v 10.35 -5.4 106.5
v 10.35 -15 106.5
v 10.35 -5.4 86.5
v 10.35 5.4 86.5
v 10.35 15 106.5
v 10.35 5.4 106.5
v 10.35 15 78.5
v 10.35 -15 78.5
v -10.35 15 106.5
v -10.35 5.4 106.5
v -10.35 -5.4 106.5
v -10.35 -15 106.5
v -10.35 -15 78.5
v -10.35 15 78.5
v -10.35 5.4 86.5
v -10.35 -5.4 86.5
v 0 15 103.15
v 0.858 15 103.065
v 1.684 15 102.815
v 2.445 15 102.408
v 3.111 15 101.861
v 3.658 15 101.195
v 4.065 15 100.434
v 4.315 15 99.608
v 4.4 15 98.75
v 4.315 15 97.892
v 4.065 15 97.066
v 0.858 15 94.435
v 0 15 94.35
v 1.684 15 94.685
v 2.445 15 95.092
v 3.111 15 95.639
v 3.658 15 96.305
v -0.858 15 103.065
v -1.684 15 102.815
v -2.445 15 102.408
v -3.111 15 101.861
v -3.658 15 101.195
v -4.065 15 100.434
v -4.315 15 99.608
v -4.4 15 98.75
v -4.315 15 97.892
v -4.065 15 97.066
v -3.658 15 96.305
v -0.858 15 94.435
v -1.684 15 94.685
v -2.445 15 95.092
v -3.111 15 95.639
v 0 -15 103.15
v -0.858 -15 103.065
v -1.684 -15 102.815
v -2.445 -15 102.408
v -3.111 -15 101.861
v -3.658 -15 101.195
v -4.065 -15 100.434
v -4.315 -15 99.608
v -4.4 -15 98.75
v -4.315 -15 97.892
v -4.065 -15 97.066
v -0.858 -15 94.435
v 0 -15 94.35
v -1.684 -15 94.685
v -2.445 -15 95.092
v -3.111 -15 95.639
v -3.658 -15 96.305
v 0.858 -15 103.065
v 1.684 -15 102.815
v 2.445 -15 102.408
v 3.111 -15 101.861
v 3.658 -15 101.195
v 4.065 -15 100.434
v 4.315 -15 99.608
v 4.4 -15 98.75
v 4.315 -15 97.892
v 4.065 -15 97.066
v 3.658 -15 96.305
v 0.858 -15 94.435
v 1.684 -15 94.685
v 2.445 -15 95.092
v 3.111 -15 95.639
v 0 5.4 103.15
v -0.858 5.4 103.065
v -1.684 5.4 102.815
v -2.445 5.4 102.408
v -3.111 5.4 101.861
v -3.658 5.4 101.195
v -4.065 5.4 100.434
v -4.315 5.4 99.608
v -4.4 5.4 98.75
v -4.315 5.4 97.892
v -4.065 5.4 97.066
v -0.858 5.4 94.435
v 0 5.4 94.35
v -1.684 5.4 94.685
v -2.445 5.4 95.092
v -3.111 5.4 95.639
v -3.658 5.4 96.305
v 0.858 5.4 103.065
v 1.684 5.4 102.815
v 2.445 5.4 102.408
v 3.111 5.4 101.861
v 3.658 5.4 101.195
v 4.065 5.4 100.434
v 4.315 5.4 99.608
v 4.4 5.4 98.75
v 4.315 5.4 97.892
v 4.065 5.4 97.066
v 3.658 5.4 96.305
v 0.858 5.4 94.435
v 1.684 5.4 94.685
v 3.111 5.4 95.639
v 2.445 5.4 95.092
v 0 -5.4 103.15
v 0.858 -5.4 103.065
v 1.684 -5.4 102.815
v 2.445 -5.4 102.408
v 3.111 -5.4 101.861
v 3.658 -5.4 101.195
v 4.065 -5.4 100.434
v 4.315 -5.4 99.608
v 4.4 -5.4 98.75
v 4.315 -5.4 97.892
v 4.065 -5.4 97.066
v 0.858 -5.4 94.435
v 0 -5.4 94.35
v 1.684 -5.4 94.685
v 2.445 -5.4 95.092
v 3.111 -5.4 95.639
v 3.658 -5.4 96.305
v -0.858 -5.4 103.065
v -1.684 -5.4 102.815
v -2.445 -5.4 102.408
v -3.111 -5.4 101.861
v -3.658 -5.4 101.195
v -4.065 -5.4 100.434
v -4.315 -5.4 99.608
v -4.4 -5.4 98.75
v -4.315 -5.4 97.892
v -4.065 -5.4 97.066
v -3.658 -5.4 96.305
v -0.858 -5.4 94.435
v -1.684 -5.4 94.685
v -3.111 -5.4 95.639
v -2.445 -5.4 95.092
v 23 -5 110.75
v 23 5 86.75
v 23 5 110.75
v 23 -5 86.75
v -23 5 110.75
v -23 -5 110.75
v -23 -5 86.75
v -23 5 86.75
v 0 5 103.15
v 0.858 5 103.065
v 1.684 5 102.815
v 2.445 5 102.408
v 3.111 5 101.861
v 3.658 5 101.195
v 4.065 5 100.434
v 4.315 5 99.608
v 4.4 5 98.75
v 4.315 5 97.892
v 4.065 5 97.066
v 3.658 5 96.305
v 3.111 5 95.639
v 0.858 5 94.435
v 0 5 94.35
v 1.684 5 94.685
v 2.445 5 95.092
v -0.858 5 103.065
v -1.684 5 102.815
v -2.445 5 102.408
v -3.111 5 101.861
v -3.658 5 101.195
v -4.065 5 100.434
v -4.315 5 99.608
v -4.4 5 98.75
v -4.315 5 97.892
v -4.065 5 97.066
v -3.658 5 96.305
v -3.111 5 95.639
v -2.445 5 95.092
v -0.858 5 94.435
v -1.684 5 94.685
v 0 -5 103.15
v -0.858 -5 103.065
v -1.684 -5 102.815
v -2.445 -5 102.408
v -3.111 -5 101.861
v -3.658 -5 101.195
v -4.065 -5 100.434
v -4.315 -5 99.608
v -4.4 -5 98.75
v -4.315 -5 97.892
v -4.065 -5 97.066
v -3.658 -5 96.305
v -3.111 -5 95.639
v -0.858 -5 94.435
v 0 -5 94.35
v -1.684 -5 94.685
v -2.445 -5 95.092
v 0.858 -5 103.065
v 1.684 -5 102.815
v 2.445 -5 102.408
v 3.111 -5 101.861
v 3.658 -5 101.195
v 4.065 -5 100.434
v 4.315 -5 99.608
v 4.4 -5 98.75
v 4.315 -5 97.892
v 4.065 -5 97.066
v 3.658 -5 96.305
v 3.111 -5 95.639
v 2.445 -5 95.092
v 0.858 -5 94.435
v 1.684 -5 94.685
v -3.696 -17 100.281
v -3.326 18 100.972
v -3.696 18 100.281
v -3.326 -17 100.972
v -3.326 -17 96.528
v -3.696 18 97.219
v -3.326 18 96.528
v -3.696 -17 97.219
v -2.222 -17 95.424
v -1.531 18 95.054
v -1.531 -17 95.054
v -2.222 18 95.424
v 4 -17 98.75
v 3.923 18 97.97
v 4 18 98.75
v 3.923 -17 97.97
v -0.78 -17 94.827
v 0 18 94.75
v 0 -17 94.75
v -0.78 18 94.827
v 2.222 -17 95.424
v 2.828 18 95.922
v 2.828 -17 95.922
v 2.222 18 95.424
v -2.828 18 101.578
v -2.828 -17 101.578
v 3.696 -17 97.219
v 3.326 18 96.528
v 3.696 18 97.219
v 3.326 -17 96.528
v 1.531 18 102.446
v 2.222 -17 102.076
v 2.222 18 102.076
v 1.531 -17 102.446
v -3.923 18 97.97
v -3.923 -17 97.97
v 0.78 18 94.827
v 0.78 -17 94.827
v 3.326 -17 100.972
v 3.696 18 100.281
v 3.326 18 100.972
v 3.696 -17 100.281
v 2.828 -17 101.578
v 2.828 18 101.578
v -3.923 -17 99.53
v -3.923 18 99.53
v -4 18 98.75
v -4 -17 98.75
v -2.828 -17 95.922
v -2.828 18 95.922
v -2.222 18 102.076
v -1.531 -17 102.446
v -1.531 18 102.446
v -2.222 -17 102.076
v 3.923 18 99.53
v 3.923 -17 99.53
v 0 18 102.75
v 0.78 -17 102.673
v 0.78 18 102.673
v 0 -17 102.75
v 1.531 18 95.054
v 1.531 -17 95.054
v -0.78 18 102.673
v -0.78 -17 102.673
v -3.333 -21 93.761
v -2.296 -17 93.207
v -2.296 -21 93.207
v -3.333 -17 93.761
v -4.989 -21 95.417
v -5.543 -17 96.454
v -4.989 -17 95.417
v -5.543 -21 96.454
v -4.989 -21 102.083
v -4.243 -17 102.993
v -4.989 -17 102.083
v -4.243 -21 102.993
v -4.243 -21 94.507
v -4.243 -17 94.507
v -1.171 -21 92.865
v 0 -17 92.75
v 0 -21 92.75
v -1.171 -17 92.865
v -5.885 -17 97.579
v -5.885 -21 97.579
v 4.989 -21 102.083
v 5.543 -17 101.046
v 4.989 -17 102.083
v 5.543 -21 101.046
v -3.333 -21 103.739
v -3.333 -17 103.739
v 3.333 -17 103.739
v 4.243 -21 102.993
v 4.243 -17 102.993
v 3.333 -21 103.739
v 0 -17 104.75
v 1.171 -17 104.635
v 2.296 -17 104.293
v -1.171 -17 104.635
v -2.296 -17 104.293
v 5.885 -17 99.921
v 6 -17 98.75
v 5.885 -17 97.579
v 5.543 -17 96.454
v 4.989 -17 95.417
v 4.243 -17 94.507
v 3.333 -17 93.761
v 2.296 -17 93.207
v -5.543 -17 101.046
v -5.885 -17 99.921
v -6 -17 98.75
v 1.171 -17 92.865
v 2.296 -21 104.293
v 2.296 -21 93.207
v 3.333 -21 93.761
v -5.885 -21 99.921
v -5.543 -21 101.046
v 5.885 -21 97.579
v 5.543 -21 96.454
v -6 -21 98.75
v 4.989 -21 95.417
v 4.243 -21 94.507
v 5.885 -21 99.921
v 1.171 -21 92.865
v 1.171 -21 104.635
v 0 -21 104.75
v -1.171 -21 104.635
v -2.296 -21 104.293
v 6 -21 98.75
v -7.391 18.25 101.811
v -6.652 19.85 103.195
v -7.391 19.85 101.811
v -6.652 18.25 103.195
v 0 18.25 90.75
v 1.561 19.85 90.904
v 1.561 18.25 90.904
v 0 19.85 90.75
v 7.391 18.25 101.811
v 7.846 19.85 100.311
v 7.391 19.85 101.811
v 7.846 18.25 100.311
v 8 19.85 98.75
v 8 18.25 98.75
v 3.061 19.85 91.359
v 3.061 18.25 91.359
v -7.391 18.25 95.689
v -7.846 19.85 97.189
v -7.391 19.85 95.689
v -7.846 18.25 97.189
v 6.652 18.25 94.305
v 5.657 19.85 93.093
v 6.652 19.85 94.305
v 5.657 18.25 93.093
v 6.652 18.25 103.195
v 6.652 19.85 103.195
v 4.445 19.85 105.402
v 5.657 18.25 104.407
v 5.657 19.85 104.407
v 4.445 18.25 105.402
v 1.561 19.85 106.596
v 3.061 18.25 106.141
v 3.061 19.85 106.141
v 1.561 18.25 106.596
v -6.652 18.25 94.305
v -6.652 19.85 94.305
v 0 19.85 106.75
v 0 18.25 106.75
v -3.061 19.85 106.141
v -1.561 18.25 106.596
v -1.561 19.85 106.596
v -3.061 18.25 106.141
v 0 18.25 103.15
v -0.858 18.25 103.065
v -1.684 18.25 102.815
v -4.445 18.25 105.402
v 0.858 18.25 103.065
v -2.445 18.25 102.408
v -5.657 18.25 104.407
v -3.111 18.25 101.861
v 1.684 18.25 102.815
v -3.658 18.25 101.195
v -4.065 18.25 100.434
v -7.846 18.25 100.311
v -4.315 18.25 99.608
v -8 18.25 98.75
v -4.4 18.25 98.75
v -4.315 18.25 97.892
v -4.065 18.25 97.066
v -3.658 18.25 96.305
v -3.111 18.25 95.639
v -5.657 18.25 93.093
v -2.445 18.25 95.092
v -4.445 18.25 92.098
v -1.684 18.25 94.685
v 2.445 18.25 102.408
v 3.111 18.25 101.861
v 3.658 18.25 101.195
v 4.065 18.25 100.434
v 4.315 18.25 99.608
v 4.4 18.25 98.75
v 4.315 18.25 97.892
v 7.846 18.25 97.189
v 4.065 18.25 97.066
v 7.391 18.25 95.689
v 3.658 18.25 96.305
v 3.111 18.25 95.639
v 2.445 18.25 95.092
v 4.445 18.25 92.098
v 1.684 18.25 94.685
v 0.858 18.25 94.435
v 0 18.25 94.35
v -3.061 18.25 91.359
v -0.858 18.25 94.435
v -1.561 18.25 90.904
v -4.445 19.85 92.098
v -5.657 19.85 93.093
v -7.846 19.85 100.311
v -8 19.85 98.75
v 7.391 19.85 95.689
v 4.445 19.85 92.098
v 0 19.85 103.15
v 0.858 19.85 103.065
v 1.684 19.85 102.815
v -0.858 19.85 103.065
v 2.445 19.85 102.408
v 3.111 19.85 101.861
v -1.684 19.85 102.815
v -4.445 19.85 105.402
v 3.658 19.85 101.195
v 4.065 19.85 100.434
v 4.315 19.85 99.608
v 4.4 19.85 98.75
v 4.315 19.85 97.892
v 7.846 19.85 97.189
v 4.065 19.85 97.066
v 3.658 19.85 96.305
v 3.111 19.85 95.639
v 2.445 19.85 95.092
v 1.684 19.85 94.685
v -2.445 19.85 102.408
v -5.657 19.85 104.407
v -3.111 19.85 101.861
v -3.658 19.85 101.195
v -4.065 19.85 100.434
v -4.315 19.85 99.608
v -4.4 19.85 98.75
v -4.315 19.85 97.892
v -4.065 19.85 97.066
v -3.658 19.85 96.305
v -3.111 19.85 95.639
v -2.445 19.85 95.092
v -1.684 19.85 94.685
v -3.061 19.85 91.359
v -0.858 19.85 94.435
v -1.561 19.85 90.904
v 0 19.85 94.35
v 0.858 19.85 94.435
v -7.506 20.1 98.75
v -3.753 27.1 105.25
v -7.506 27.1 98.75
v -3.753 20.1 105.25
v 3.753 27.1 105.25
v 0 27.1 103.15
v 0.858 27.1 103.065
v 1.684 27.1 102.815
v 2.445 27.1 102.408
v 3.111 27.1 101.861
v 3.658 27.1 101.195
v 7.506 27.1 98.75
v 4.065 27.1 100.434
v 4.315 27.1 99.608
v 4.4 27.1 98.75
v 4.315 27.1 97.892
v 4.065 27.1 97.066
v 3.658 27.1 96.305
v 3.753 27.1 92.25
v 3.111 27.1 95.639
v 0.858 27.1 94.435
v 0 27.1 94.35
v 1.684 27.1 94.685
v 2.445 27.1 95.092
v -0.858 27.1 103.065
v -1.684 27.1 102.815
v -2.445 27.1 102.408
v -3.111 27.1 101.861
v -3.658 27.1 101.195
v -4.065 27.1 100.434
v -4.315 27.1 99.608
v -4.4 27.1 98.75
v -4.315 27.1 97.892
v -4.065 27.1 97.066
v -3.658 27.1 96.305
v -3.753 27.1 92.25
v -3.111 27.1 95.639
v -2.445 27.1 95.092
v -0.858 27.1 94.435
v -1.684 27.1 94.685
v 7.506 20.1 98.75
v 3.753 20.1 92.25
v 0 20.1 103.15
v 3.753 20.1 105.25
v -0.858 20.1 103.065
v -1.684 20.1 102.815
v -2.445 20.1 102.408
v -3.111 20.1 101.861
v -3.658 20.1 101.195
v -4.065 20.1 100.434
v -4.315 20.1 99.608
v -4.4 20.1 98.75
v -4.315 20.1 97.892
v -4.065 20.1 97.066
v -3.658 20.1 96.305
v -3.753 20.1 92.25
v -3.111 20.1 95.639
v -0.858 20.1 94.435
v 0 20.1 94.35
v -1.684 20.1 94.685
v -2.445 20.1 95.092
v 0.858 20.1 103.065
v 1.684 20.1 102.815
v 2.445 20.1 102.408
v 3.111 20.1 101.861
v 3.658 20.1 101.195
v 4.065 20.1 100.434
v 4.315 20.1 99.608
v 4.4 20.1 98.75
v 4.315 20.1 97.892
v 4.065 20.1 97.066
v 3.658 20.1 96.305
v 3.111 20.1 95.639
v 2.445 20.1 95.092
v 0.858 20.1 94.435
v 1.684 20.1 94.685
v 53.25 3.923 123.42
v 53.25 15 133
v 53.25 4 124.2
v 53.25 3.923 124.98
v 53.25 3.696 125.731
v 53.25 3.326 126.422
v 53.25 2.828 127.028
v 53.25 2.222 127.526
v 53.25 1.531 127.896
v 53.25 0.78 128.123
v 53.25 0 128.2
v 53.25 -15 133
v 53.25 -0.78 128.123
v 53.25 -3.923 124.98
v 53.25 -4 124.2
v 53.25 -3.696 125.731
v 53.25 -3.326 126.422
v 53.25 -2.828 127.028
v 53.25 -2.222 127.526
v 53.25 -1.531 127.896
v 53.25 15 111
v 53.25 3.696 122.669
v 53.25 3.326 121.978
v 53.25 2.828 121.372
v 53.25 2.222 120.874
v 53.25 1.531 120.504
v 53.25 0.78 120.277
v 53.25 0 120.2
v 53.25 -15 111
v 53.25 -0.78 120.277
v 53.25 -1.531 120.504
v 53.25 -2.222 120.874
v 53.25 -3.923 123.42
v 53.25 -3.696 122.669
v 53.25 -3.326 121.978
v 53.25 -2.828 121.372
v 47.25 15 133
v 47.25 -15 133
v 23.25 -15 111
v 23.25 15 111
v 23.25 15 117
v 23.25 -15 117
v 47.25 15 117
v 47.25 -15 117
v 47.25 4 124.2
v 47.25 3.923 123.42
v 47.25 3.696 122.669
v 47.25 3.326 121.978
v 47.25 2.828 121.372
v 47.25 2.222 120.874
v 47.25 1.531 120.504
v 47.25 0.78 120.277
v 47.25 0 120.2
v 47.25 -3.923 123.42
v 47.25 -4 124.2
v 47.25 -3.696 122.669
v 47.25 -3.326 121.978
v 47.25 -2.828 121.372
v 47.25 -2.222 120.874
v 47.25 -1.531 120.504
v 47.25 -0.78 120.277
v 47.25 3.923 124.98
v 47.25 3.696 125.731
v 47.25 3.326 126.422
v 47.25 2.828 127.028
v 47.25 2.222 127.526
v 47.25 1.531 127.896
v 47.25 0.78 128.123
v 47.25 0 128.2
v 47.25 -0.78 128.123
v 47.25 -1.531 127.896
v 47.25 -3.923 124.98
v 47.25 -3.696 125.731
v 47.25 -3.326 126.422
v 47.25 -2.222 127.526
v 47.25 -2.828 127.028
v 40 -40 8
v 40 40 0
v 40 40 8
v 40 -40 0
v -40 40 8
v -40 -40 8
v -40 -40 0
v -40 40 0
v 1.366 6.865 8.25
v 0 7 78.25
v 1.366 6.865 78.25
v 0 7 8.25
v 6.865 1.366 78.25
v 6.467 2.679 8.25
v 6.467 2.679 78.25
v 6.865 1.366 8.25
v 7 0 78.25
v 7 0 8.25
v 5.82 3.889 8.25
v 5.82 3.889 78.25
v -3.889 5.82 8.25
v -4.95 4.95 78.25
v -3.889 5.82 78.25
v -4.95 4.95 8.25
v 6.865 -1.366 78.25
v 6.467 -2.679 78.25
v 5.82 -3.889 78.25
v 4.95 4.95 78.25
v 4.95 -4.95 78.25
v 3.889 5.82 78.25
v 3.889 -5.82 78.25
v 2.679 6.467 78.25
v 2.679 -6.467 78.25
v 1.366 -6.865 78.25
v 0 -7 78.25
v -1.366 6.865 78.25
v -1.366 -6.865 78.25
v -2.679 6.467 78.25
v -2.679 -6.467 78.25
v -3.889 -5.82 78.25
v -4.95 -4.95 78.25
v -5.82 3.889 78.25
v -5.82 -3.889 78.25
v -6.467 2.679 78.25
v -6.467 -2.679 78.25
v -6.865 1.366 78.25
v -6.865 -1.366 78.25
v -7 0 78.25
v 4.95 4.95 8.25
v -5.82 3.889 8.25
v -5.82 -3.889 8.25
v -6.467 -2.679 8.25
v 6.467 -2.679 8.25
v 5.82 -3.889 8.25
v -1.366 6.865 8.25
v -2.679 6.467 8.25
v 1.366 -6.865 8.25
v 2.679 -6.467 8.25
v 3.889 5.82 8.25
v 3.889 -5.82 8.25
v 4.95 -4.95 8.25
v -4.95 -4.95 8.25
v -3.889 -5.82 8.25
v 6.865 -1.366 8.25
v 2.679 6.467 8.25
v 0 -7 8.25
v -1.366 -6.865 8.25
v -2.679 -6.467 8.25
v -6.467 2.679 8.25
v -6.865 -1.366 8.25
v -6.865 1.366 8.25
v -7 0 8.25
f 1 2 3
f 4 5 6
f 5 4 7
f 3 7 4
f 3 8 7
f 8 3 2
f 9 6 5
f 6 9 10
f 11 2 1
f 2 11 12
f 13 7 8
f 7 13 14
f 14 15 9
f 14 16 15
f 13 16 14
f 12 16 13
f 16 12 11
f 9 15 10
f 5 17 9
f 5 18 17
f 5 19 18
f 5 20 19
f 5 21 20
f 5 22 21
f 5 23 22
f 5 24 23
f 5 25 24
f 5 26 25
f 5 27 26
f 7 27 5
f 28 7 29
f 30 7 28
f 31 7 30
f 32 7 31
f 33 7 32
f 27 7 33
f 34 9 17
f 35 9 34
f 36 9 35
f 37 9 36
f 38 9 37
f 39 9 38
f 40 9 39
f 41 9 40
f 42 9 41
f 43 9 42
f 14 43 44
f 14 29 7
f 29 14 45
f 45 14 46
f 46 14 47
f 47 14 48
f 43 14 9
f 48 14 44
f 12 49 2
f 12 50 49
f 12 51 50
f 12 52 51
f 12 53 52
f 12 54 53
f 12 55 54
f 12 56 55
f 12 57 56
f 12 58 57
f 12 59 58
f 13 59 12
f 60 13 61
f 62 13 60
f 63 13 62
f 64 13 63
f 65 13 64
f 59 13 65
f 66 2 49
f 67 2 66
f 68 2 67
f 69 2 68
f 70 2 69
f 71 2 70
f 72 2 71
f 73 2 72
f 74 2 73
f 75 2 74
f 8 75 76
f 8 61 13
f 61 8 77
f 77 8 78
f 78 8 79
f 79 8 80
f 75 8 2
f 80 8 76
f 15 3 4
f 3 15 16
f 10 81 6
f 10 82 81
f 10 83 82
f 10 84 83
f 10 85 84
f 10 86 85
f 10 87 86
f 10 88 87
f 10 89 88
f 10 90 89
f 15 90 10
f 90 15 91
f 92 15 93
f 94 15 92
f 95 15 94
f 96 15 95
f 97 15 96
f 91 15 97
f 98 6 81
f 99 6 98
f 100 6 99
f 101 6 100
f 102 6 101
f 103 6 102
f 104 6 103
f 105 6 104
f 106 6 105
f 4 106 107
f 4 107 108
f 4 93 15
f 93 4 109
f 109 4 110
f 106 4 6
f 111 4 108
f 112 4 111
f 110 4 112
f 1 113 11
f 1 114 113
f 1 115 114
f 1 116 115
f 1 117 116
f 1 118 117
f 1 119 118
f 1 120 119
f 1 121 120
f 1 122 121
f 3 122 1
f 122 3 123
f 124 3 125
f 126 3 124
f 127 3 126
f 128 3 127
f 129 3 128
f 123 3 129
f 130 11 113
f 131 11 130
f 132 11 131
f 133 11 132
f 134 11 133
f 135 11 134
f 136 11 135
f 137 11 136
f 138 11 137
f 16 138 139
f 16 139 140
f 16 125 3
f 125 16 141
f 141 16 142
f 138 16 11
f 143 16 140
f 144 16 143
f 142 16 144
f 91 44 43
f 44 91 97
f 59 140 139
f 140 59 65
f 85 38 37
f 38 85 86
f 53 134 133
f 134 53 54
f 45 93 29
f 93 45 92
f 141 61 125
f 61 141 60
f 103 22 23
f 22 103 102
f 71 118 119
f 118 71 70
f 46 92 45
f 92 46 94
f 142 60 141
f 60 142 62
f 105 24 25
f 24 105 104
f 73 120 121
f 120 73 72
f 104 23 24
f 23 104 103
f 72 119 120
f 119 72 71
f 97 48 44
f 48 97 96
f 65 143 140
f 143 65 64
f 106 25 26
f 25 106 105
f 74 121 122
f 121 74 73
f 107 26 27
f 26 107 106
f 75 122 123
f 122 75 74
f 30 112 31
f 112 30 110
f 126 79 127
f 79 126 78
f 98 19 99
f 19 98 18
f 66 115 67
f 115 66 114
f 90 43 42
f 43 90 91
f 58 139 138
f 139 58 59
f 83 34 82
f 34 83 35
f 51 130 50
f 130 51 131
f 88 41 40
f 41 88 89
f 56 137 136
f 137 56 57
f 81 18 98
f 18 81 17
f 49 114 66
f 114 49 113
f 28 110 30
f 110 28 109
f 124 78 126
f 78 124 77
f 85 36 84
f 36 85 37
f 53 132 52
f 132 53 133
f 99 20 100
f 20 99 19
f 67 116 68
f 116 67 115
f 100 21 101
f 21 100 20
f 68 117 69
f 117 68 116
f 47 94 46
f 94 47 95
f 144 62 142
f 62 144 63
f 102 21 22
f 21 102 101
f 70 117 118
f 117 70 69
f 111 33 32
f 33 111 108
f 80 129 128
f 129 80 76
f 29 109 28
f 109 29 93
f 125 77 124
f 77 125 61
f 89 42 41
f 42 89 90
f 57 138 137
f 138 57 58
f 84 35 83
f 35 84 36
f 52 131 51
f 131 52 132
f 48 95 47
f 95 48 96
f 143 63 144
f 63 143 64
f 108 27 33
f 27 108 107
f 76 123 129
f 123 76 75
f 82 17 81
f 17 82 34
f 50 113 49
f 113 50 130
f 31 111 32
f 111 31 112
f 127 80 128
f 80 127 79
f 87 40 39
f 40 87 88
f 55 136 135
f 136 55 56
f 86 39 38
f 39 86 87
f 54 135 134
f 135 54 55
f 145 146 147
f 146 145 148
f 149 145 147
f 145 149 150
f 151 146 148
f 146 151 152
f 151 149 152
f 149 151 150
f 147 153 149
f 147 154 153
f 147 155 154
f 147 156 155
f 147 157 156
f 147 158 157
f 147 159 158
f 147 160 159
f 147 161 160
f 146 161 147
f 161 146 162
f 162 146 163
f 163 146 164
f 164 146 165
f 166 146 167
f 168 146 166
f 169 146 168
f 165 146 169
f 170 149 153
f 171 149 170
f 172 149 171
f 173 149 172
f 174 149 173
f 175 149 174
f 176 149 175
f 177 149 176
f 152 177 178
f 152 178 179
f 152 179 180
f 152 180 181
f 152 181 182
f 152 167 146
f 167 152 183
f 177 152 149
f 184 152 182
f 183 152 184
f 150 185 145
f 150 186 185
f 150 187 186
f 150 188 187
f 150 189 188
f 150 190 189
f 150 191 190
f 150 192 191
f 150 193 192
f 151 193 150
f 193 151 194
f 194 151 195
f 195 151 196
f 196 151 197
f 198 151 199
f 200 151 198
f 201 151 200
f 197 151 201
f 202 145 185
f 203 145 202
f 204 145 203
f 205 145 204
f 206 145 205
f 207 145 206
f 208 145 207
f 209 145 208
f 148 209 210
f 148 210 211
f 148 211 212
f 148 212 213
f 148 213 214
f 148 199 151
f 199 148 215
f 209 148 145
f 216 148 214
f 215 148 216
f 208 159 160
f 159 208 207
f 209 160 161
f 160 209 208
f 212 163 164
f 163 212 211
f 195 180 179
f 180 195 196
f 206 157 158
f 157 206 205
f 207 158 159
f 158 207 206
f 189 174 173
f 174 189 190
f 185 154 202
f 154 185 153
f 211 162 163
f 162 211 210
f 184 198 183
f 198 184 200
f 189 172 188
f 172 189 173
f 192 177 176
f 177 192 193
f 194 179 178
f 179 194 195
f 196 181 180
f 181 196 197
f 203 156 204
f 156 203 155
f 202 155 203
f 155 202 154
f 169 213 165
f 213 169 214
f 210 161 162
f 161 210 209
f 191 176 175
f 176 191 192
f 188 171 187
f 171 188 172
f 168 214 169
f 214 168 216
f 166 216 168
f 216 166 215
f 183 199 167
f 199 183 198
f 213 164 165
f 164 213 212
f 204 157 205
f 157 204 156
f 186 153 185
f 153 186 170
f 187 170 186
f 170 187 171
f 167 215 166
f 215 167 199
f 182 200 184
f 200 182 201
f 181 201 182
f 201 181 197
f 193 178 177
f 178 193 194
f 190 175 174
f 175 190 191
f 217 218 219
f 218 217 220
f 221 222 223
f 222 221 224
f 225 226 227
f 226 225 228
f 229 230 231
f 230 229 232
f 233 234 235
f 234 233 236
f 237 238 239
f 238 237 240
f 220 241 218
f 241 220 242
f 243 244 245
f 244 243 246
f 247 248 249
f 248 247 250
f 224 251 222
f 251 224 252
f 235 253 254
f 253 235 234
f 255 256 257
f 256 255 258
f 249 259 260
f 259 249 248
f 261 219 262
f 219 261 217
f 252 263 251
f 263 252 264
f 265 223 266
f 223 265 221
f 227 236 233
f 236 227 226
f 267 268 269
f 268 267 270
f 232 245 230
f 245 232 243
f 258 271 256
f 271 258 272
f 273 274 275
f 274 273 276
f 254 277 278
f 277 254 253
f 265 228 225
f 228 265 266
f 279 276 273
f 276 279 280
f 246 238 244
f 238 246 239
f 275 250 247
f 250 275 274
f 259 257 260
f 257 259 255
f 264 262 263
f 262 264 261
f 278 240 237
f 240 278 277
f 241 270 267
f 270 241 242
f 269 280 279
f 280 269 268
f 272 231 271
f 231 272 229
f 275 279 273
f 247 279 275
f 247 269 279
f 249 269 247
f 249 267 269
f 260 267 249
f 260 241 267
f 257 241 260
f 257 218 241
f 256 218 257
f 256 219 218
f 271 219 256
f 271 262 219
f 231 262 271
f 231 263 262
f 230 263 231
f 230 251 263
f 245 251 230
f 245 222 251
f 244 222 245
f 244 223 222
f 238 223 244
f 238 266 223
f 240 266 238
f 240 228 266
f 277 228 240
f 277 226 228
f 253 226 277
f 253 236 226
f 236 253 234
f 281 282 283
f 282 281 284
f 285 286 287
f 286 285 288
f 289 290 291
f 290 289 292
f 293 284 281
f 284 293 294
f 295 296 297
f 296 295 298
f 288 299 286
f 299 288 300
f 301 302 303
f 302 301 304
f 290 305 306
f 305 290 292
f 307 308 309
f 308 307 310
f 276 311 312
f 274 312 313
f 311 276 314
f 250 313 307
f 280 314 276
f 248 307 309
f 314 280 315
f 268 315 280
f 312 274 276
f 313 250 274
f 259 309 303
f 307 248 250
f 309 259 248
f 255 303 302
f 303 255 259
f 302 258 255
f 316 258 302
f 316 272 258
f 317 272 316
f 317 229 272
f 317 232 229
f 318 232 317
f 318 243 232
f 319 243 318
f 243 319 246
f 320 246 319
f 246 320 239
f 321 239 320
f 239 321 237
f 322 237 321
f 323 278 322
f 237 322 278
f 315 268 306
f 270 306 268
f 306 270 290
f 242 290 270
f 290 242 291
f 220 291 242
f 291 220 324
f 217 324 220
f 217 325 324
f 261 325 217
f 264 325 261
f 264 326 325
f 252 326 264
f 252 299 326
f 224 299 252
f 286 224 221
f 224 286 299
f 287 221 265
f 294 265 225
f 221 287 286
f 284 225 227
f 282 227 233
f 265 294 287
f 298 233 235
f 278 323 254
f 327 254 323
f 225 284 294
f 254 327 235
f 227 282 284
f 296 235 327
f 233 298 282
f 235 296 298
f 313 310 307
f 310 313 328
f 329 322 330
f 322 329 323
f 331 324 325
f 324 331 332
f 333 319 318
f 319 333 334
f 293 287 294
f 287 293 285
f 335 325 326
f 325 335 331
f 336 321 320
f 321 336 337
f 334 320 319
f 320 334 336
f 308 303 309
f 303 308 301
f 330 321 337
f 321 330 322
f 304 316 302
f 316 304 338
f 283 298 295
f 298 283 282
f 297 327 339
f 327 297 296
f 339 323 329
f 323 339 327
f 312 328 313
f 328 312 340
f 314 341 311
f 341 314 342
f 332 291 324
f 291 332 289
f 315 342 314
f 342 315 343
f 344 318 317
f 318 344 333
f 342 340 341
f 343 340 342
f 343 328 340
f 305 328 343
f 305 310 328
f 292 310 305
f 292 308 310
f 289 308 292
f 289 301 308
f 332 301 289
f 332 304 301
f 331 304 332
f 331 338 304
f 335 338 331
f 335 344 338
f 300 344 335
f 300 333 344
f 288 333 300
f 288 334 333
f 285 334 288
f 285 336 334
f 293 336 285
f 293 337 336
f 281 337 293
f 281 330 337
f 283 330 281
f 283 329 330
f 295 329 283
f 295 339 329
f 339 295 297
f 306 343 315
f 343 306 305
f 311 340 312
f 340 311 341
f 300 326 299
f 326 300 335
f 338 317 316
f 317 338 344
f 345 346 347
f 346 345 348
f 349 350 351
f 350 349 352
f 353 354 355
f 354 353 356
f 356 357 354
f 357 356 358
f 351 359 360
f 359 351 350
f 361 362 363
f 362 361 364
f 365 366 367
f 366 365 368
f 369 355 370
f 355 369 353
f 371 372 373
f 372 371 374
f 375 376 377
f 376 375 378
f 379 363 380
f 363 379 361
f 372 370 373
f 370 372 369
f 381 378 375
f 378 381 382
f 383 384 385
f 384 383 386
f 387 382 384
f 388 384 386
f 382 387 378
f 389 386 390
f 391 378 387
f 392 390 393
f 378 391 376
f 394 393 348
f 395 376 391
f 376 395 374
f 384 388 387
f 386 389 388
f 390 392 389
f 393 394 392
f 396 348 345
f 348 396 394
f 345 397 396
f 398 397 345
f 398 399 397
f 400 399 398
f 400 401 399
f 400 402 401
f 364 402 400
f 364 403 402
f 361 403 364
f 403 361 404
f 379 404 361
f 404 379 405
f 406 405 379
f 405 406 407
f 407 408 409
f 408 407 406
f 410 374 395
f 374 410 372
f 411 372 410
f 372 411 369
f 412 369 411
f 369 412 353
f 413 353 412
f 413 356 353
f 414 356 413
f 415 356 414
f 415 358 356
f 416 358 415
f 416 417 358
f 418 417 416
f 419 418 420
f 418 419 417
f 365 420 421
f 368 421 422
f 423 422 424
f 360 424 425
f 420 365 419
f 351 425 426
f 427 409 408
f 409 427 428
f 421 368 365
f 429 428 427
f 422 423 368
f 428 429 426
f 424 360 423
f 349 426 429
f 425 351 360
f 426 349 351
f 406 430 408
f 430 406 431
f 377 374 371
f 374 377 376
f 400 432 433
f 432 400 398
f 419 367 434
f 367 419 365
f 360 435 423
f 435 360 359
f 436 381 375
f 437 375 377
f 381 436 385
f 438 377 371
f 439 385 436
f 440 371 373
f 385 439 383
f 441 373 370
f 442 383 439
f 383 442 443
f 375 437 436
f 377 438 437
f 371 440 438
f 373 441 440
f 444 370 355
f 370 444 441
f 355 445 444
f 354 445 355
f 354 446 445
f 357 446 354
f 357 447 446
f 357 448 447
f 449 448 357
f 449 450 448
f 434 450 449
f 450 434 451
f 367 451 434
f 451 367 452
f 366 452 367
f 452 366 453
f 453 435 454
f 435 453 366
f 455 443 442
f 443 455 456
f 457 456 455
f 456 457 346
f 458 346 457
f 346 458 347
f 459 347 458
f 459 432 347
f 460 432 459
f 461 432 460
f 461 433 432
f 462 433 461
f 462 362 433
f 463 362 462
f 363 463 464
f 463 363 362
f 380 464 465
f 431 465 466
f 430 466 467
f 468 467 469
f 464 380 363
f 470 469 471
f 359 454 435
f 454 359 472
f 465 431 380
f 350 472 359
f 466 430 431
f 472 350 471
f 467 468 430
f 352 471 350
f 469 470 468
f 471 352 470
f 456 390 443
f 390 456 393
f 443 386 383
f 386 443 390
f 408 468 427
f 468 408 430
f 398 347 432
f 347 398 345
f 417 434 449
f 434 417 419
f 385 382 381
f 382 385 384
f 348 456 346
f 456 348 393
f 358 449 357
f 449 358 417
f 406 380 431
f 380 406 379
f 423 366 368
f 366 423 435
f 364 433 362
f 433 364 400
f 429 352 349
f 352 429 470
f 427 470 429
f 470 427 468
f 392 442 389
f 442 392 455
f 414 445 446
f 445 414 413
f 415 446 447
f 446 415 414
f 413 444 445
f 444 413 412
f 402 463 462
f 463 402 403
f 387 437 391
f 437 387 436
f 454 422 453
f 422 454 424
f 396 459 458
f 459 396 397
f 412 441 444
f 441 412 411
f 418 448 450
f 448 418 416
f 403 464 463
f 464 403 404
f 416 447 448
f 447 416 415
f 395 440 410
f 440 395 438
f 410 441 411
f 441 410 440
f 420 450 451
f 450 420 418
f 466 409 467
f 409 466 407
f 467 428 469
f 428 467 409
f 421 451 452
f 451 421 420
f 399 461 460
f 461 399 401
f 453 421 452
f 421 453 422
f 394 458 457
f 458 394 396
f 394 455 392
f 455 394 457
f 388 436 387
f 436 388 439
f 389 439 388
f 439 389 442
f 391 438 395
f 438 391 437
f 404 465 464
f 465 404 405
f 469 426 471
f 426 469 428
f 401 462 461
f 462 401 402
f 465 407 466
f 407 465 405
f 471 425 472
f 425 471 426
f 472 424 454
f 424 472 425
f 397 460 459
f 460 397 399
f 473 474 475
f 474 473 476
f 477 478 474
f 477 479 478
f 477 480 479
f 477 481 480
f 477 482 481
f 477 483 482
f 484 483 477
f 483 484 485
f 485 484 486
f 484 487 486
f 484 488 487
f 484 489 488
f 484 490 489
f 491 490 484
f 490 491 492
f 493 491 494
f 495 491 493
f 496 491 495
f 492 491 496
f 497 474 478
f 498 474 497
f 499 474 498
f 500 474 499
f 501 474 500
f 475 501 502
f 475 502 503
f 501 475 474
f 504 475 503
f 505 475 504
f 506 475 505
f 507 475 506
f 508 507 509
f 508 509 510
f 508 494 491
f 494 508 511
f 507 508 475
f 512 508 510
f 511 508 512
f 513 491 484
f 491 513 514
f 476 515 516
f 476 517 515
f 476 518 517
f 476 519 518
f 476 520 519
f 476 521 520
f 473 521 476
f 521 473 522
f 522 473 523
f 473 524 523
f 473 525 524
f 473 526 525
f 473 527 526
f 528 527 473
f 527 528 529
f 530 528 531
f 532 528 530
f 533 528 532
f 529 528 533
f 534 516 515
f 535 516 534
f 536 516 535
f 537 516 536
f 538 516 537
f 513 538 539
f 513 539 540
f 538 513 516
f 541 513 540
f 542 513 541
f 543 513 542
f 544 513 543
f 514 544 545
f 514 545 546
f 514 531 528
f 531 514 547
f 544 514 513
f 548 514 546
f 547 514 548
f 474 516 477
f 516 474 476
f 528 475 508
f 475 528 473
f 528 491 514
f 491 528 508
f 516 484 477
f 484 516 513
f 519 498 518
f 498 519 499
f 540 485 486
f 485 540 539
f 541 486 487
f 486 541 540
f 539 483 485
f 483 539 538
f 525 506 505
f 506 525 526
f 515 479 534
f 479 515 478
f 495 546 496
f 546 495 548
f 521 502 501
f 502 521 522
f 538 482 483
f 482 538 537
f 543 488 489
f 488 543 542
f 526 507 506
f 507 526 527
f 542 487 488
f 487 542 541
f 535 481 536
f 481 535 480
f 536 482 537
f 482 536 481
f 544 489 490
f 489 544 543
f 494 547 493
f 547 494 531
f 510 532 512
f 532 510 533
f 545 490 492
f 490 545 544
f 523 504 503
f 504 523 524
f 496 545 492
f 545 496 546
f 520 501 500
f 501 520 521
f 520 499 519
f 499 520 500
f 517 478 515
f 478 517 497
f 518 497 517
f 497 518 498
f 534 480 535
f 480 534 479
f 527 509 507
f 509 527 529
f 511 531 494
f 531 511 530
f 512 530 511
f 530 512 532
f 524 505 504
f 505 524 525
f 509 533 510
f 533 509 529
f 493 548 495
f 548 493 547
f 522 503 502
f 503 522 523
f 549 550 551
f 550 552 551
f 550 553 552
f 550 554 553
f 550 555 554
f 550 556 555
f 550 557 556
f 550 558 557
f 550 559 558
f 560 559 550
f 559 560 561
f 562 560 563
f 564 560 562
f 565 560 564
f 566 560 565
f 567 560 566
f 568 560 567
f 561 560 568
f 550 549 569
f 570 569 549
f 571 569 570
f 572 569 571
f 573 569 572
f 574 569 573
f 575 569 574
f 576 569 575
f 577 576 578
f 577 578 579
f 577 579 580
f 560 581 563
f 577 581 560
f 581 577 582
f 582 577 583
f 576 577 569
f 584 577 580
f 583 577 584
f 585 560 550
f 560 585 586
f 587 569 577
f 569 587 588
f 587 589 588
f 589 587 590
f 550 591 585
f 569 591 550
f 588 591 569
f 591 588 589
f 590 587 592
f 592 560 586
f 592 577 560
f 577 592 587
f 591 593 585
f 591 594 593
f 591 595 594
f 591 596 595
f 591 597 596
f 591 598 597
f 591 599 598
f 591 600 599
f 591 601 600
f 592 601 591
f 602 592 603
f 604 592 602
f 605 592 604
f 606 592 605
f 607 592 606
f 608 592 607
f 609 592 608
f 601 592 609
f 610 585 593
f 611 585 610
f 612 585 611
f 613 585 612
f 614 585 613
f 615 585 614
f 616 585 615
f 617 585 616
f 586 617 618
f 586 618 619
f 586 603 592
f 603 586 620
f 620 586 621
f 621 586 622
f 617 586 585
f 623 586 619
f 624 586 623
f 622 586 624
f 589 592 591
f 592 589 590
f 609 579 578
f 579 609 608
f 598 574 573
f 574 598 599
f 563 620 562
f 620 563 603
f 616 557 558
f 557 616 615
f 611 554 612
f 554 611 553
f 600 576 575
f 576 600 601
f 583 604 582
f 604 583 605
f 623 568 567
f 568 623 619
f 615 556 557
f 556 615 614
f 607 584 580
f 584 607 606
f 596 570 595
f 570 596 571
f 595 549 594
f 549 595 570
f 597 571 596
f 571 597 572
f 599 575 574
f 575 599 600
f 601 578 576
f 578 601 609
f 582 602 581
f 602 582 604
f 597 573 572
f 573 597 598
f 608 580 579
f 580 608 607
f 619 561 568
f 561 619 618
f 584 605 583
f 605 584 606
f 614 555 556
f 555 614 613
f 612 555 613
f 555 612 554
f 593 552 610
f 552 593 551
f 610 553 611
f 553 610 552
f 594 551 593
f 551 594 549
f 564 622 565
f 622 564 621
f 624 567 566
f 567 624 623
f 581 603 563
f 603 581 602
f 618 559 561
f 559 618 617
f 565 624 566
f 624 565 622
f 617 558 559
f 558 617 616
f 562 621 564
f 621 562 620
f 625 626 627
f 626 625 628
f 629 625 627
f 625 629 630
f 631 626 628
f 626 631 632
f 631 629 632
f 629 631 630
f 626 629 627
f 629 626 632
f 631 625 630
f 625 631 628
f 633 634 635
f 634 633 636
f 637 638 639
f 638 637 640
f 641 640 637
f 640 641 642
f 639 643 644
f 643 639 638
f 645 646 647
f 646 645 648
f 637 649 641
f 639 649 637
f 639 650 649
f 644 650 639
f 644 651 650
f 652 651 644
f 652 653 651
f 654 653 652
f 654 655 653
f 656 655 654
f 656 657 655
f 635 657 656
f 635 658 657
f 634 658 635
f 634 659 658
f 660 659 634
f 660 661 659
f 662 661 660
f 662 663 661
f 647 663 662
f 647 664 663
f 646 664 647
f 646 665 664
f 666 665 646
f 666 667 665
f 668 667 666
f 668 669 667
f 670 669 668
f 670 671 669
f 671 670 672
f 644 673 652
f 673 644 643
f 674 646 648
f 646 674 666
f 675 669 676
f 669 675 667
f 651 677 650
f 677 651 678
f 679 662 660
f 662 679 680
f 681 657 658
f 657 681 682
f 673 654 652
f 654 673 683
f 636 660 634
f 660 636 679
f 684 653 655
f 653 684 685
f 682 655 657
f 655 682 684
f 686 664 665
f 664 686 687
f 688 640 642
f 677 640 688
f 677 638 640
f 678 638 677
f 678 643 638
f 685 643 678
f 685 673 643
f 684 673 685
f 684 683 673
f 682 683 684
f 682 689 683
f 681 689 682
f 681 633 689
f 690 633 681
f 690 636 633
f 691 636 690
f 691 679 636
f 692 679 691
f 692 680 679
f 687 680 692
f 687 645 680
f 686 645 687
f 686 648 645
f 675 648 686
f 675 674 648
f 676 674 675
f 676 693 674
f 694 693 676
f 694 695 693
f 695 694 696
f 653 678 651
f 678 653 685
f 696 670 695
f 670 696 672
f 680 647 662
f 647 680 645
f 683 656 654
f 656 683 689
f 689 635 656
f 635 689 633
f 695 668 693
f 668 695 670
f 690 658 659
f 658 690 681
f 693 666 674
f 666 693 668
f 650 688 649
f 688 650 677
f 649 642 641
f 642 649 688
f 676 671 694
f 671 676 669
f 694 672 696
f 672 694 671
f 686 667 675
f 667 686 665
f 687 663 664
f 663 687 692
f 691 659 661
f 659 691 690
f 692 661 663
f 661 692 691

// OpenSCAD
$fn = 32;

// ------------------------------------------------------------------------
// Lamp arm: column d14 x 70 mm, arm 46 mm
// Every part is its own module, assembly() places every instance.
// ------------------------------------------------------------------------

// --- part 1 ---
module lamp_base() {
  difference() {
    translate([-40, -40, 0]) cube([80, 80, 8]);
  }
}

// --- part 2 ---
module lamp_column() {
  cylinder(h = 70, d = 14);
}

// --- part 3 ---
module head_fork() {
  difference() {
    translate([-10.35, -15, 0]) cube([20.7, 30, 28]);
    translate([-11.35, -5.4, 8]) cube([22.7, 10.8, 21]);
    translate([0, 0, 20.25]) rotate([90, 0, 0]) cylinder(h = 32, d = 8.8, center = true);
  }
}

// --- part 4 ---
module lamp_arm() {
  difference() {
    translate([-23, -5, 0]) cube([46, 10, 24]);
    translate([0, 0, 12]) rotate([90, 0, 0]) cylinder(h = 12, d = 8.8, center = true);
  }
}

// --- part 5 ---
module arm_pin() {
  rotate([0, 90, 0]) cylinder(h = 36, d = 8, center = true);
  translate([-21, 0, 0]) rotate([0, 90, 0]) cylinder(h = 4, d = 12);
}

// --- part 6 ---
module arm_washer() {
  difference() {
      translate([0, 0, 0]) cylinder(h = 1.6, d = 16);
      translate([0, 0, -1]) cylinder(h = 3.6, d = 8.8);
    }
}

// --- part 7 ---
module arm_nut() {
  difference() {
    linear_extrude(height = 7) polygon(points = [[7.506, 0], [3.753, 6.5], [-3.753, 6.5], [-7.506, 0], [-3.753, -6.5], [3.753, -6.5]]);
    translate([0, 0, -1]) cylinder(h = 9, d = 8.8);
  }
}

// --- part 8 ---
module shade_bracket() {
  difference() {
    translate([-15, -15, 0]) cube([30, 30, 22]);
    translate([-16, -16, 6]) cube([25, 32, 17]);
    translate([12, 0, 13.2]) rotate([0, 90, 0]) cylinder(h = 8, d = 8, center = true);
  }
}

// --- assembly ---
module assembly() {
  color([0.80, 0.24, 0.20]) translate([0, 0, 0]) rotate([0, 0, 0]) lamp_base();
  color([0.20, 0.45, 0.75]) translate([0, 0, 8.25]) rotate([0, 0, 0]) lamp_column();
  color([0.25, 0.62, 0.32]) translate([0, 0, 78.5]) rotate([0, 0, 0]) head_fork();
  color([0.92, 0.70, 0.18]) translate([0, 0, 86.75]) rotate([0, 0, 0]) lamp_arm();
  color([0.58, 0.35, 0.70]) translate([0, 0, 98.75]) rotate([0, 0, 90]) arm_pin();
  color([0.16, 0.66, 0.66]) translate([0, 19.85, 98.75]) rotate([90, 0, 0]) arm_washer();
  color([0.85, 0.48, 0.18]) translate([0, 27.1, 98.75]) rotate([90, 0, 0]) arm_nut();
  color([0.55, 0.60, 0.65]) translate([38.25, 0, 111]) rotate([0, 0, 0]) shade_bracket();
}

assembly();
